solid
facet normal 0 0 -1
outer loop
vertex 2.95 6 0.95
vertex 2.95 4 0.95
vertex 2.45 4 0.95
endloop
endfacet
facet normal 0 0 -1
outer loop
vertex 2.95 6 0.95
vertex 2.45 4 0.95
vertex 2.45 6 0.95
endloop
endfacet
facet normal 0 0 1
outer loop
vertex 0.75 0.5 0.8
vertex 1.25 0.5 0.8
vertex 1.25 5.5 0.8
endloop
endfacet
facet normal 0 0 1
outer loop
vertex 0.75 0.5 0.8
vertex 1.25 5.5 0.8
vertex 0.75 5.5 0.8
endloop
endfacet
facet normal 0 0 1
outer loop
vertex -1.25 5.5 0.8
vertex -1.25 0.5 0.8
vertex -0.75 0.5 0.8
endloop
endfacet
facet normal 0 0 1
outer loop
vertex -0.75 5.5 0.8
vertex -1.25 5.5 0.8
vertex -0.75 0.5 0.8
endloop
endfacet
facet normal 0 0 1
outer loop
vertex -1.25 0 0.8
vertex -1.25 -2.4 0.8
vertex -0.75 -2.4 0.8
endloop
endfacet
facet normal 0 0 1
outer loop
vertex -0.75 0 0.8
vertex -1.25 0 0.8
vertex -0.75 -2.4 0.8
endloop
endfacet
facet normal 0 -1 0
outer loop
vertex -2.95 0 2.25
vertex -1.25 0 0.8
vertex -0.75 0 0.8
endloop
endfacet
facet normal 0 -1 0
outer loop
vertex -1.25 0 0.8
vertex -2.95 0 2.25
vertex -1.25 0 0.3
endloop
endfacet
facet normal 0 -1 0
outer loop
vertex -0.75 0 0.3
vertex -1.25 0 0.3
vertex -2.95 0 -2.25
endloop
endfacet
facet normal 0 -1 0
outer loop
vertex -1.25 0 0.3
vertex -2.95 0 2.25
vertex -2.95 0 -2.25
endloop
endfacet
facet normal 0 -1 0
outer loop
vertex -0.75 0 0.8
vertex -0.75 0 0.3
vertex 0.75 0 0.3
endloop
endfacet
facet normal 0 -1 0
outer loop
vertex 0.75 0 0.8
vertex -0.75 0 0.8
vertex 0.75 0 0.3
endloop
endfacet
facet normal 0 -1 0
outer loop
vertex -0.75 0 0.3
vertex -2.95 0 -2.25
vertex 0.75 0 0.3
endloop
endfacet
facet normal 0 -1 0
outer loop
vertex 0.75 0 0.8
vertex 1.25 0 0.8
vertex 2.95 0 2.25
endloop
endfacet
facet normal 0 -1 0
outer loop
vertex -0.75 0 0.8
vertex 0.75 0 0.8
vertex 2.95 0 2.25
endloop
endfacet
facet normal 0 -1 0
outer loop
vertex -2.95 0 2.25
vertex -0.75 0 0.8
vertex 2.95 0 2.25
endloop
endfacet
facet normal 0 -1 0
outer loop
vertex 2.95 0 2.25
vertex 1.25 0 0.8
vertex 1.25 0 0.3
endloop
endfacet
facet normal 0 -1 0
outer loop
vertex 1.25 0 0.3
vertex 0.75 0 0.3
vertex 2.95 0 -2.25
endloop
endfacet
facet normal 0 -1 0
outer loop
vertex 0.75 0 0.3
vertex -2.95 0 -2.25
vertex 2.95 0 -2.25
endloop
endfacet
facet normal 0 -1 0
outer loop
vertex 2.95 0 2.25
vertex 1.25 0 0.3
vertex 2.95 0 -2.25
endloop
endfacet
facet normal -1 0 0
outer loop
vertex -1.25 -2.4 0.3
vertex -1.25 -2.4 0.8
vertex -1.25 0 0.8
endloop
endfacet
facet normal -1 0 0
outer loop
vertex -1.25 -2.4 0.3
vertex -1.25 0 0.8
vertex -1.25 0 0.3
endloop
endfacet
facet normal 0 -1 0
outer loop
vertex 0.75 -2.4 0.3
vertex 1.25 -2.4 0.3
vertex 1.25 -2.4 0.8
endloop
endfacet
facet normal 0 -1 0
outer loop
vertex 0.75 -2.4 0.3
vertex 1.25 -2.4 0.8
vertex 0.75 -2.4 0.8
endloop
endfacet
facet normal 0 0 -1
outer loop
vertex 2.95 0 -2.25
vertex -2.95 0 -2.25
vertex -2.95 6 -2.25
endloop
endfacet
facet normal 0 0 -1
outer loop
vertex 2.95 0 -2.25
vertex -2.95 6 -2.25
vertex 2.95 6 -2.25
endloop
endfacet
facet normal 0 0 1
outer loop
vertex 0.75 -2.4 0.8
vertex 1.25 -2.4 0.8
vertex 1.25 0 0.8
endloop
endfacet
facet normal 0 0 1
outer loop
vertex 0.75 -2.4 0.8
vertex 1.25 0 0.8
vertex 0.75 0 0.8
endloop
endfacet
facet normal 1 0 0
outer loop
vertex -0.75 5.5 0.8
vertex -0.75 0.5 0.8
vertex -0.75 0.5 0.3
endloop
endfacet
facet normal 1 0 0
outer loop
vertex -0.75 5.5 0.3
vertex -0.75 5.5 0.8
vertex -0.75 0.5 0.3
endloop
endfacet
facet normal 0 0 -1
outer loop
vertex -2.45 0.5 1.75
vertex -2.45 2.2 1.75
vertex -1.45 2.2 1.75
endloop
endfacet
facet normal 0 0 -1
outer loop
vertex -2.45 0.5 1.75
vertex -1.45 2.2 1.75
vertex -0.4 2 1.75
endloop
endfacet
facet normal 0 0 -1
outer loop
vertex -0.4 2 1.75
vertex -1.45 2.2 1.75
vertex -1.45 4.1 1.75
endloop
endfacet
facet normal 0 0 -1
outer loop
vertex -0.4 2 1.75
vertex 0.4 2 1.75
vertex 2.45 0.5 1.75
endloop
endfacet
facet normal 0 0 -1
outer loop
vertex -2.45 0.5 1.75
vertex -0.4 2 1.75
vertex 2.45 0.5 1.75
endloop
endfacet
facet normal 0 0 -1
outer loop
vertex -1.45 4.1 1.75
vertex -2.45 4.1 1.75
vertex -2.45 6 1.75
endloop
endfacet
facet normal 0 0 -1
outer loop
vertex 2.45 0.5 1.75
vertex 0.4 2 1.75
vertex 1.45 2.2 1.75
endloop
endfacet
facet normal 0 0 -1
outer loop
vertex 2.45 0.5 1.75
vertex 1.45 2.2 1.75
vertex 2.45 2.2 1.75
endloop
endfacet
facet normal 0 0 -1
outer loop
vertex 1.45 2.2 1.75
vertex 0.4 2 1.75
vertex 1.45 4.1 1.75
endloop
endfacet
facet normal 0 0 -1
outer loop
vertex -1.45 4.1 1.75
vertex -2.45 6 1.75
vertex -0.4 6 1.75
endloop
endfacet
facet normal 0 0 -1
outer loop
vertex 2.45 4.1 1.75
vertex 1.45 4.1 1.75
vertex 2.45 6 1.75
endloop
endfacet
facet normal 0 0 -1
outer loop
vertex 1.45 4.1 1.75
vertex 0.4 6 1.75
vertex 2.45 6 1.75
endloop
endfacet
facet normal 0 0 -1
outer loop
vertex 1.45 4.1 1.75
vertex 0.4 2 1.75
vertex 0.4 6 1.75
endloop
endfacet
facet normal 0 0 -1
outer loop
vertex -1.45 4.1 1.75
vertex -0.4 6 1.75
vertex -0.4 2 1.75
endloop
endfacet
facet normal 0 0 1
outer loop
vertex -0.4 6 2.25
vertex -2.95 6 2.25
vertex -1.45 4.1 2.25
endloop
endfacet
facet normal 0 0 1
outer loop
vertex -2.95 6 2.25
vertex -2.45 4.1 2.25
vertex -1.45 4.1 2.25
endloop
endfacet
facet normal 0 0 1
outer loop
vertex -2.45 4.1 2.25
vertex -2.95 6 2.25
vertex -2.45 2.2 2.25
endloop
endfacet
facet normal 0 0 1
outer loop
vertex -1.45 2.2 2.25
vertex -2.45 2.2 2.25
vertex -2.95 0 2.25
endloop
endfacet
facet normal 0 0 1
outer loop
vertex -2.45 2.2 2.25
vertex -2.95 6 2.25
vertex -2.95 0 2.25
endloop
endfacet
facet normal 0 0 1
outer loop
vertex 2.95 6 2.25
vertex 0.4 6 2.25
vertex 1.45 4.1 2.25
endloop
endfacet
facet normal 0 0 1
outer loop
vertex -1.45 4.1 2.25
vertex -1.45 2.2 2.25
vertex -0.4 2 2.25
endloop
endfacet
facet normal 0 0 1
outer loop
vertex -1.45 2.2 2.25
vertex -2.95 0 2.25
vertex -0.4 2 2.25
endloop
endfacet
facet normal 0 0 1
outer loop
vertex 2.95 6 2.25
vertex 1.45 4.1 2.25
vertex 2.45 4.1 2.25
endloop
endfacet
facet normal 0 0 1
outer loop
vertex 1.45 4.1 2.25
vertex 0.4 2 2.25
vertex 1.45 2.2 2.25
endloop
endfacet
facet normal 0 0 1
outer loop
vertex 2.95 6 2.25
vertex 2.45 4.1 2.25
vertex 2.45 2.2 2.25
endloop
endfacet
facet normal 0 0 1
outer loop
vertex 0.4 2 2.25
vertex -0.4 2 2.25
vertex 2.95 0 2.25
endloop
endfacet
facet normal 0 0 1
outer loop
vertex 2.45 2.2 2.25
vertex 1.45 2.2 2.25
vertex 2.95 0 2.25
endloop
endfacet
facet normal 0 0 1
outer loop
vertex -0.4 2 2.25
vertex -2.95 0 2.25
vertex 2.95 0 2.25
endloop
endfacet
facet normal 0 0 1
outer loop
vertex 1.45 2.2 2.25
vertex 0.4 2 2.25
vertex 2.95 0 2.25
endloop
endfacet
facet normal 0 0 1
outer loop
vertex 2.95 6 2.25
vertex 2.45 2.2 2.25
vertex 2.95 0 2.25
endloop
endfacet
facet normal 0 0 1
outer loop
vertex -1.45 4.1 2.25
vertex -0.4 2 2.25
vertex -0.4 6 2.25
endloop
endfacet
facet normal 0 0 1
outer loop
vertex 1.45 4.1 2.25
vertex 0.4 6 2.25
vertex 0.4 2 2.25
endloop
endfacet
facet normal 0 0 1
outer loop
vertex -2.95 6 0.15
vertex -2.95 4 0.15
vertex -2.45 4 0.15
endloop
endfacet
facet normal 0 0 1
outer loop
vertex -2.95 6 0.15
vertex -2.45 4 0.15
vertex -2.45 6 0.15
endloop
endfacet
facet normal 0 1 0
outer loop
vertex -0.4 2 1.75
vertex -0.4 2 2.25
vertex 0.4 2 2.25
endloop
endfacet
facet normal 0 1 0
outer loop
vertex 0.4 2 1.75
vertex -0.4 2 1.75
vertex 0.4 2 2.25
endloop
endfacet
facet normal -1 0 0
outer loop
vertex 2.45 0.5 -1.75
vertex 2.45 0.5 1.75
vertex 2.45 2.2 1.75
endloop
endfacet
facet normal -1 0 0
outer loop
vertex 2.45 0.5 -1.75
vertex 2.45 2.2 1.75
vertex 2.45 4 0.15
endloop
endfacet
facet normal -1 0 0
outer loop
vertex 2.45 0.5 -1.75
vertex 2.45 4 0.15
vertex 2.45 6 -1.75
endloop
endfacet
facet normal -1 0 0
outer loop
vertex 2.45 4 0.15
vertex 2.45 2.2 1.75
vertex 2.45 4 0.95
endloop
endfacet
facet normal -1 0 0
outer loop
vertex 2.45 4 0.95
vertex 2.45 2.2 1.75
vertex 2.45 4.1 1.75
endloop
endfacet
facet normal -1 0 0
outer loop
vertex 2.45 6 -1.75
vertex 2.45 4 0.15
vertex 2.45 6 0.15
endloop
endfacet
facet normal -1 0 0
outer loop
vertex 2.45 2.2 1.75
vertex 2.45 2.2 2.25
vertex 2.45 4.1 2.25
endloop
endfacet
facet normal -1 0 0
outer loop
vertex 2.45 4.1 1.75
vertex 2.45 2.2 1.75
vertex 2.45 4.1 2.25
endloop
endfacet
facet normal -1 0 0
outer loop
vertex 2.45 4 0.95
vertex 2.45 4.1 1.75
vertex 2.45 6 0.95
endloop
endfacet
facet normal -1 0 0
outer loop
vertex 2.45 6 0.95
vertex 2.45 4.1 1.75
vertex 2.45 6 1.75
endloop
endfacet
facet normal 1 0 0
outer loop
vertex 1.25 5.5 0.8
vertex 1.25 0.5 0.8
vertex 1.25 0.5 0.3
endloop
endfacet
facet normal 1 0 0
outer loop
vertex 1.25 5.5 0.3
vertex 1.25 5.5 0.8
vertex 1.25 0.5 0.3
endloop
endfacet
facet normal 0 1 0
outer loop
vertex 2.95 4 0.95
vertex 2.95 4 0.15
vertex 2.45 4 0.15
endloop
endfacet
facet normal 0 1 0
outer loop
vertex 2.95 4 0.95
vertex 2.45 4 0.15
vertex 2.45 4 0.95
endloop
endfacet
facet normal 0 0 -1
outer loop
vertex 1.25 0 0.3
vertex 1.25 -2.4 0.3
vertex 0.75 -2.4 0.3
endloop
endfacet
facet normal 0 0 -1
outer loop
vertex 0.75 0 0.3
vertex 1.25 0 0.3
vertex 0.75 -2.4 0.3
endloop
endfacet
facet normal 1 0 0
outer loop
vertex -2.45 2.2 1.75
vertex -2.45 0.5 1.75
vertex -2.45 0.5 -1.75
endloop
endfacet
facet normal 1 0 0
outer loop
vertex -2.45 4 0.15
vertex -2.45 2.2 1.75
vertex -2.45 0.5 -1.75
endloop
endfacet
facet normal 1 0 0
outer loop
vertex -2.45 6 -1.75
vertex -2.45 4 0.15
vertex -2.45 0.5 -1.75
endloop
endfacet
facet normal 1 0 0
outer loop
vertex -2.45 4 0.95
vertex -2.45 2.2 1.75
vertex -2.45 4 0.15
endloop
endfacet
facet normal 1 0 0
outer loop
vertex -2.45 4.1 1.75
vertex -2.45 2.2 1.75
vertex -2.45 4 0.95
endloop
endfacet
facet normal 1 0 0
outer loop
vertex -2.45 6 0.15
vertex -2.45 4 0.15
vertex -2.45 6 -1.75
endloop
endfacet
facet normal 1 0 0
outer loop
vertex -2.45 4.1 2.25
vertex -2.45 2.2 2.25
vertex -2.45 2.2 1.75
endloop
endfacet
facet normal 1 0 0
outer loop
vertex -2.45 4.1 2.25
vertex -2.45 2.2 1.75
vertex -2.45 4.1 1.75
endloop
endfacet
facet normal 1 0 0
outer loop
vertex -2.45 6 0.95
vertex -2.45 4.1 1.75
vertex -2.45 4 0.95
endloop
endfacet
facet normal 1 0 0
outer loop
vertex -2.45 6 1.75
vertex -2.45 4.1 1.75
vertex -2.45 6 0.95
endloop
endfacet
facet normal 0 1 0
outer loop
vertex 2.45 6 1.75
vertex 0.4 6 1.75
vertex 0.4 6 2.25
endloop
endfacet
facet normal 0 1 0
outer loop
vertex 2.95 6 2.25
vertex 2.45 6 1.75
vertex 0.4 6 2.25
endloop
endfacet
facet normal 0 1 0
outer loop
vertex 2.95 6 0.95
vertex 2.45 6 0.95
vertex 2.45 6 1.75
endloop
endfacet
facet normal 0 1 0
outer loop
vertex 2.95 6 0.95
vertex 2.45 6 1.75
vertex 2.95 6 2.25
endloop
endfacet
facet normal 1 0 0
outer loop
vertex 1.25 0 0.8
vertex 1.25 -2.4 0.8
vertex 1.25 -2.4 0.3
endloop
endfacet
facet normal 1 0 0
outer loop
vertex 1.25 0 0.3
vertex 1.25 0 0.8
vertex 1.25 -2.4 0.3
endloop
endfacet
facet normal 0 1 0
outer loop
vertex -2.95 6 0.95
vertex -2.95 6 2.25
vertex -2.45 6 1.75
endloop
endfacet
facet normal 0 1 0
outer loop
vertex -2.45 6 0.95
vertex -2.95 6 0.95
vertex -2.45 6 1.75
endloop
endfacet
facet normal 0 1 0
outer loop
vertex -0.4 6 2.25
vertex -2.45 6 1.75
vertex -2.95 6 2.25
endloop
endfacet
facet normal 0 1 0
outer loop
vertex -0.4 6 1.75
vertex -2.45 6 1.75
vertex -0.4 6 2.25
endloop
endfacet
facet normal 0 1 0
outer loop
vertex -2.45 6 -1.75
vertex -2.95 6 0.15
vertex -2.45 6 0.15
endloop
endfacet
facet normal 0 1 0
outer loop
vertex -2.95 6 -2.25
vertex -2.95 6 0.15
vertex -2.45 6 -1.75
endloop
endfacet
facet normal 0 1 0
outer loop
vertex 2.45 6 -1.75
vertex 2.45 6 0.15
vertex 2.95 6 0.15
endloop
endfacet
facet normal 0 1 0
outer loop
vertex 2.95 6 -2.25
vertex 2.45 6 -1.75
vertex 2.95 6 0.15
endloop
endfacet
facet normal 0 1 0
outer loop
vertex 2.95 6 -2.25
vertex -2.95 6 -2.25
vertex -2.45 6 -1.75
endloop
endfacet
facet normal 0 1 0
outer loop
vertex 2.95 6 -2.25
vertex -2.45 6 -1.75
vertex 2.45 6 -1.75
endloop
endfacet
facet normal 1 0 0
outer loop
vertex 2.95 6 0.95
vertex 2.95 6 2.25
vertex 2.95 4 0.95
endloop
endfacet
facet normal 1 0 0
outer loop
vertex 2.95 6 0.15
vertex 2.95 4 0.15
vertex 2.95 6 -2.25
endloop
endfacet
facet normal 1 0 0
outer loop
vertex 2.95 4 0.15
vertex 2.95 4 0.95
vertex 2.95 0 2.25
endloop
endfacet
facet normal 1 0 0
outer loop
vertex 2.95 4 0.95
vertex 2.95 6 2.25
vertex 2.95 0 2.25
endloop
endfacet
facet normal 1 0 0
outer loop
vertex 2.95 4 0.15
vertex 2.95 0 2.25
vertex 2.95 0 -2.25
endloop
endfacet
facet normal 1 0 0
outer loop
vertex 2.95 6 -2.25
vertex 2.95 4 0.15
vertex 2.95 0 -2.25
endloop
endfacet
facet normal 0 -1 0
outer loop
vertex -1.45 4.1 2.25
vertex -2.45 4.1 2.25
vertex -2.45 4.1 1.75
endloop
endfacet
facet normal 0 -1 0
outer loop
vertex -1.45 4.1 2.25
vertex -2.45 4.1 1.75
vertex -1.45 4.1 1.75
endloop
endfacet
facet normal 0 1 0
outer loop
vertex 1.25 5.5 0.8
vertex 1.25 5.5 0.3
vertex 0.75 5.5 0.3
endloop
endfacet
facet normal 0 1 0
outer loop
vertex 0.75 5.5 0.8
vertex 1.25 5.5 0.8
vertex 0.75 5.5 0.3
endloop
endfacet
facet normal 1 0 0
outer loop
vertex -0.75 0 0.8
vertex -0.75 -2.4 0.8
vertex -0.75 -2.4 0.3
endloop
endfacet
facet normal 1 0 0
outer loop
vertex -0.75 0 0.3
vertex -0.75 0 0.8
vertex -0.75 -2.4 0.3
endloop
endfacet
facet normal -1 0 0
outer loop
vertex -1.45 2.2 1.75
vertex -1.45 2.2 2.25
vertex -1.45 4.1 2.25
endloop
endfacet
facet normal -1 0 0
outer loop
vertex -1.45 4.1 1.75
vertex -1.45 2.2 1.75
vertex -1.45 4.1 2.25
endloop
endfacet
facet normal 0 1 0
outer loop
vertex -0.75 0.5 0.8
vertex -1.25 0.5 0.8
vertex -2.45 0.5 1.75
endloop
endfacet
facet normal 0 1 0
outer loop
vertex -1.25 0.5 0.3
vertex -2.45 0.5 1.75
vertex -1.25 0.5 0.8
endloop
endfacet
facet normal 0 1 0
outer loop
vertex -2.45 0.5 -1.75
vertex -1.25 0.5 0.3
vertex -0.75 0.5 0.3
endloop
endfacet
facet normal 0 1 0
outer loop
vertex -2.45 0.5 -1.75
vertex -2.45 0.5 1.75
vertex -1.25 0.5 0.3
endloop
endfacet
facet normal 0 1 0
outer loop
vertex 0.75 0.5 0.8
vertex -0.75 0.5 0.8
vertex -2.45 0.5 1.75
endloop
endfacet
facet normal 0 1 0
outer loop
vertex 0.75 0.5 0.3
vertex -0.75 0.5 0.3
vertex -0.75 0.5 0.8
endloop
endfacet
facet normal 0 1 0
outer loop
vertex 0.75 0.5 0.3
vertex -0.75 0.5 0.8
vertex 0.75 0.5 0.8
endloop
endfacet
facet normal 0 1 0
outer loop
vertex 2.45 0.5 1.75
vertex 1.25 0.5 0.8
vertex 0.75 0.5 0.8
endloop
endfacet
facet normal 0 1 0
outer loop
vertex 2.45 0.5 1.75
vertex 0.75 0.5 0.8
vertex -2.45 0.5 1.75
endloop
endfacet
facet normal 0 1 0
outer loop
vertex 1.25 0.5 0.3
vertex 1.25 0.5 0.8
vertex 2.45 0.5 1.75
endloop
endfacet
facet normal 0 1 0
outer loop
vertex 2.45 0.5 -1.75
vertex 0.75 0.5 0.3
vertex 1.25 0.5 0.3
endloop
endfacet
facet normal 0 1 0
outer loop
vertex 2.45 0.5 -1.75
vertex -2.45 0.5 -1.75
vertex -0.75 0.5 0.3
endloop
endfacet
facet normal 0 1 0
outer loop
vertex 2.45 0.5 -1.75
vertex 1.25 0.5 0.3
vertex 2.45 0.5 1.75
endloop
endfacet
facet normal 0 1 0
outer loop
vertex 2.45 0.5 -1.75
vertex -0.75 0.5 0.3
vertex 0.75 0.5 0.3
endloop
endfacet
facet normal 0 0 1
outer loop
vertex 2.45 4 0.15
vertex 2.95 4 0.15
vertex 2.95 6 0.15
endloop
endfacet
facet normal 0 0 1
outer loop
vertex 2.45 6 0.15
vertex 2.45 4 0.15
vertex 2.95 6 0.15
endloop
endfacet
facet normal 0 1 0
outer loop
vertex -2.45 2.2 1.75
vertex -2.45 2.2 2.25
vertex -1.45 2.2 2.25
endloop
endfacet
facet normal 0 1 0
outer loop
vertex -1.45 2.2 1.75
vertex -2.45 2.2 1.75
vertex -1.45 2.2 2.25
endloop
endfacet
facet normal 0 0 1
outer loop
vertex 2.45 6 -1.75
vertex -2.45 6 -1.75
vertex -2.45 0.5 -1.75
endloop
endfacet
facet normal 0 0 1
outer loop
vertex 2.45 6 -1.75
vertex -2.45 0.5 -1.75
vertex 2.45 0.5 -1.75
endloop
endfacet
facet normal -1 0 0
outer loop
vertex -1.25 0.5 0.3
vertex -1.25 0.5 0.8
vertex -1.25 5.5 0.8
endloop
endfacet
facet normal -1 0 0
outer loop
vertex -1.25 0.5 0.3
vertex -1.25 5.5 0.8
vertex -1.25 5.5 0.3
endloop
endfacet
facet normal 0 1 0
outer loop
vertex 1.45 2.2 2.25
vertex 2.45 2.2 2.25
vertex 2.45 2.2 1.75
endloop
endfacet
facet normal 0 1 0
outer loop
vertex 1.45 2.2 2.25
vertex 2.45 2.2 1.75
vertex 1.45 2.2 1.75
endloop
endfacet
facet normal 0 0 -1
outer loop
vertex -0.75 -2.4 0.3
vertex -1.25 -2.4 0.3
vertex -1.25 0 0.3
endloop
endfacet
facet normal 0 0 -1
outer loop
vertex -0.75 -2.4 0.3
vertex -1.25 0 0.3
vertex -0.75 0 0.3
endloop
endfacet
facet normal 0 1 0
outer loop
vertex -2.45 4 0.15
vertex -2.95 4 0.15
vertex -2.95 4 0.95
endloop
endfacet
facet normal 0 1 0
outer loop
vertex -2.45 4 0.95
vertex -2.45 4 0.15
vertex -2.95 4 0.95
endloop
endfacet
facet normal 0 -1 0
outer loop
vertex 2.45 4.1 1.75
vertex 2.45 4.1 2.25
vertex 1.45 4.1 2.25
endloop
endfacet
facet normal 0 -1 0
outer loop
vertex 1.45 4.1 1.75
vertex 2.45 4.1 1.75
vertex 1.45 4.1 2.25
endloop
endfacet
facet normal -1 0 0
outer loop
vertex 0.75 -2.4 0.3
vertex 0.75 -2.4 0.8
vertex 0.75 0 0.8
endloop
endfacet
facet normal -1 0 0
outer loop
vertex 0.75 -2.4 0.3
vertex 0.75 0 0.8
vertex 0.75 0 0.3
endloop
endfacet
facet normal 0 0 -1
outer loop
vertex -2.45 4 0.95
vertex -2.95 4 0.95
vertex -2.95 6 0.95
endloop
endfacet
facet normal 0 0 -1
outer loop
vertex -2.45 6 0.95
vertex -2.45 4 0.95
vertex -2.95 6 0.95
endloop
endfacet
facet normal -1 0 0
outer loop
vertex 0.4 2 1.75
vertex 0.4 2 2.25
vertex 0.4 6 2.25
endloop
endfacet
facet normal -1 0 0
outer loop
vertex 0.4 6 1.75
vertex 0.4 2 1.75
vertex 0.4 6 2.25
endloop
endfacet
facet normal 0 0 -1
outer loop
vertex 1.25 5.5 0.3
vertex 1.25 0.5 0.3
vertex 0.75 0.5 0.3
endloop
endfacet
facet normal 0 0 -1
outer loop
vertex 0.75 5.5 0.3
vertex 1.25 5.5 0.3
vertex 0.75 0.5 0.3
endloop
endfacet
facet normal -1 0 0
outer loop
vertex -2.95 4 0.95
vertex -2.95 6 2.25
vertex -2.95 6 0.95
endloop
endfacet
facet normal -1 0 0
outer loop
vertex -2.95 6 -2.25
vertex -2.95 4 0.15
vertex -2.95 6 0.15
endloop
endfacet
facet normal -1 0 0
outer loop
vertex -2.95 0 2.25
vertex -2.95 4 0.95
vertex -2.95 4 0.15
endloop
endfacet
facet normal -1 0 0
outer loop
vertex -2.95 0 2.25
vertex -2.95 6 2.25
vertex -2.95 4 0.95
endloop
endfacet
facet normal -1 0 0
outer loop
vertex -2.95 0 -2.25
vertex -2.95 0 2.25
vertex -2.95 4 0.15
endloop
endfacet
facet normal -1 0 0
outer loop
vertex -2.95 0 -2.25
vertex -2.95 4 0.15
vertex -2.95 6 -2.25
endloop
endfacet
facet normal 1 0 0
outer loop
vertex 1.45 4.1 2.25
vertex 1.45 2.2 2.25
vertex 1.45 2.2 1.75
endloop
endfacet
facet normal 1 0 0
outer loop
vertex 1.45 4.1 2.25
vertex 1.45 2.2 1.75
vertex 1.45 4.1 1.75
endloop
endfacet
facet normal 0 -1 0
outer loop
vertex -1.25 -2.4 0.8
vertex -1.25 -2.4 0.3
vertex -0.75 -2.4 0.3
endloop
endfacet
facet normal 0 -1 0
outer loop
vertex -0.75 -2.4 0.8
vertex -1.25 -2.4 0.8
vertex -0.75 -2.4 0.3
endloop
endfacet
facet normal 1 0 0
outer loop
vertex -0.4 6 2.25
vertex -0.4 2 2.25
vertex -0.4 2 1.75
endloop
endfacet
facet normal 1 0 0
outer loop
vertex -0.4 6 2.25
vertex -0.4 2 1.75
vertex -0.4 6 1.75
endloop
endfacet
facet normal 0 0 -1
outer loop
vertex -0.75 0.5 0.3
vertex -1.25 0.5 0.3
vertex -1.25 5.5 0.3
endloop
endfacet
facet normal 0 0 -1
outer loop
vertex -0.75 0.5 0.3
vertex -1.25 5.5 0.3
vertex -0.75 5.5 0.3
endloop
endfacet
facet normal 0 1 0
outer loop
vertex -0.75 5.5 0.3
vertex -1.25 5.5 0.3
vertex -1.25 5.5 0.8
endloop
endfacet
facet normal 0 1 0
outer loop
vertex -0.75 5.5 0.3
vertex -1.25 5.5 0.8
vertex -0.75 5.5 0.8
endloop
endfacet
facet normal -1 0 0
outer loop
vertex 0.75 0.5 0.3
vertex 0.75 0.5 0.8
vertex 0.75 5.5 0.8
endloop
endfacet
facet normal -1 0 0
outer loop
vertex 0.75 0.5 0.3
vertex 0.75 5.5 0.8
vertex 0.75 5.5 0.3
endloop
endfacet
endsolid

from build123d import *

# Parameters (mm, degrees)
SKETCH1_W           = 5.9
SKETCH1_H           = 4.5
BOSS_EXTRUDE1_DEPTH = 6
SKETCH2_W           = 4.9
SKETCH2_H           = 3.5
CUT_EXTRUDE1_DEPTH  = 5.5
SKETCH3_W           = 1
SKETCH3_H           = 1.9
CUT_EXTRUDE2_DEPTH  = 0.5
BOSS_EXTRUDE2_START = -2.9
SKETCH4_W           = 0.5
SKETCH4_H           = 0.5
BOSS_EXTRUDE2_DEPTH = 7.9
SKETCH5_W           = 0.8
SKETCH5_H           = 2
CUT_EXTRUDE3_DEPTH  = 0.5
SKETCH6_W           = 0.8
SKETCH6_H           = 4
CUT_EXTRUDE4_DEPTH  = 0.5


with BuildPart() as part:
    # Sketch1 → Boss-Extrude1 (new body)
    with BuildSketch(Plane(origin=(0, 0, 0), x_dir=(1, 0, 0), z_dir=(0, 1, 0))):
        Rectangle(SKETCH1_W, SKETCH1_H)
    extrude(amount=BOSS_EXTRUDE1_DEPTH)

    # Sketch2 → Cut-Extrude1 (cut)
    with BuildSketch(Plane(origin=(0, 6, 0), x_dir=(1, 0, 0), z_dir=(0, 1, 0))):
        Rectangle(SKETCH2_W, SKETCH2_H)
    extrude(amount=-CUT_EXTRUDE1_DEPTH, mode=Mode.SUBTRACT)

    # Sketch3 → Cut-Extrude2 (cut)
    with BuildSketch(Plane.XY.offset(2.25)):
        with Locations((-1.95, 3.15)):
            Rectangle(SKETCH3_W, SKETCH3_H)
    cut_extrude2 = extrude(amount=-CUT_EXTRUDE2_DEPTH, mode=Mode.SUBTRACT)

    # Sketch4 → Boss-Extrude2 (add)
    with BuildSketch(Plane(origin=(0, 0.5, 0), x_dir=(1, 0, 0), z_dir=(0, 1, 0)).offset(BOSS_EXTRUDE2_START)):
        with Locations((-1, -0.55)):
            Rectangle(SKETCH4_W, SKETCH4_H)
    boss_extrude2 = extrude(amount=BOSS_EXTRUDE2_DEPTH)

    # Sketch5 → Cut-Extrude3 (cut)
    with BuildSketch(Plane.ZY.offset(2.95)):
        with Locations((0.55, 5)):
            Rectangle(SKETCH5_W, SKETCH5_H)
    cut_extrude3 = extrude(amount=-CUT_EXTRUDE3_DEPTH, mode=Mode.SUBTRACT)

    # Mirror1: Cut-Extrude2, Cut-Extrude3 across plane
    add(cut_extrude2.mirror(Plane(origin=(0, 0, 0), x_dir=(0, 0, 1), z_dir=(1, 0, 0))), mode=Mode.SUBTRACT)
    add(cut_extrude3.mirror(Plane(origin=(0, 0, 0), x_dir=(0, 0, 1), z_dir=(1, 0, 0))), mode=Mode.SUBTRACT)

    # Sketch6 → Cut-Extrude4 (cut)
    with BuildSketch(Plane.XY.offset(2.25)):
        with Locations((0, 4)):
            Rectangle(SKETCH6_W, SKETCH6_H)
    extrude(amount=-CUT_EXTRUDE4_DEPTH, mode=Mode.SUBTRACT)

    # Mirror2: Boss-Extrude2 across plane
    add(boss_extrude2.mirror(Plane(origin=(0, 0, 0), x_dir=(0, 0, 1), z_dir=(1, 0, 0))))


solid = part.part
